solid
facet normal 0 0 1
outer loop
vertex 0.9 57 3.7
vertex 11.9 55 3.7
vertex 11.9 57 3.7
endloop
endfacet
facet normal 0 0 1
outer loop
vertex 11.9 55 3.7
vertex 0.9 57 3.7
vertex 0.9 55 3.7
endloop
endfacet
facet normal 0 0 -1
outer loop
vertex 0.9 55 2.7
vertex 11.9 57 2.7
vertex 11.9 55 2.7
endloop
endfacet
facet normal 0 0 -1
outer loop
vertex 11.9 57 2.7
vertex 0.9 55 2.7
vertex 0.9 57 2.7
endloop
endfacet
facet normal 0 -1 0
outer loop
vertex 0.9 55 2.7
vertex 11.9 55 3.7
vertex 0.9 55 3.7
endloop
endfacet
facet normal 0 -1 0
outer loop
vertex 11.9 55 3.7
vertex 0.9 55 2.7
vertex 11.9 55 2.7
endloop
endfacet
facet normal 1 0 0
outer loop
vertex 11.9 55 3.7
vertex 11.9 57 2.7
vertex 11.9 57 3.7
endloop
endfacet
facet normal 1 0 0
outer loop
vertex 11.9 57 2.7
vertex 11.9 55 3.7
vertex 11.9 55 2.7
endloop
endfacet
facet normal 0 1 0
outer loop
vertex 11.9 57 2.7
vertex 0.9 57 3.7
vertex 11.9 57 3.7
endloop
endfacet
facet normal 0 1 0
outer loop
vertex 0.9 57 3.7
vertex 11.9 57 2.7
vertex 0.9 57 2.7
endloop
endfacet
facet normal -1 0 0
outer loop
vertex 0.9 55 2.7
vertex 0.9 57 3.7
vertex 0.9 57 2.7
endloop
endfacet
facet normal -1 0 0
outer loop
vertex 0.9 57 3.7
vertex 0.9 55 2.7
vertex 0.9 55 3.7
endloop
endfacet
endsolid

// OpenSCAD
$fn = 100;

shell_thickness = 1;
metal_thickness = 1.3;

bump1_r = 3;
bump1_from_tip = 2.9 + bump1_r;
bump2_r = 3.95;
bump2_from_tip = 49 + bump2_r;


l1 = 11;
l2 = 45;
l3 = 2;
w1 = 12.3;
w2 = 12.8;
w3 = 9;
w4 = 10.5;
h1 = 8.7;
h2 = 2.7;

center = [w2/2, (l1 + l2)/2, h1/2];

x1 = (w2 - w1)/2;
x2 = (w2 + w1)/2;
x3 = w2;
x4 = (w2 + w3)/2;
x5 = (w2 - w3)/2;
x6 = (w2 - w4)/2;
x7 = (w2 + w4)/2;

y1 = l1;
y2 = l1 + l2;
y3 = -l3;

z1 = h1;
z2 = (h1 - h2)*(l2/(l1 + l2)) + h2;
z3 = h2;
z4 = h1/2;

points = [
  [x1, 0, 0],
  [x2, 0, 0],
  [x3, y1, 0],
  [x4, y2, 0],
  [x5, y2, 0],
  [0, y1, 0],
  [x1, 0, z1],
  [x2, 0, z1],
  [x3, y1, z2],
  [x4, y2, z3],
  [x5, y2, z3],
  [0, y1, z2],
  [x6, y3, z4],
  [x7, y3, z4]
];

faces = [
  [0, 1, 2, 3, 4, 5],
  [1, 7, 8, 2],
  [2, 8, 9, 3],
  [3, 9, 10, 4],
  [4, 10, 11, 5],
  [5, 11, 6, 0],
  [6, 11, 10, 9, 8, 7],
  [0, 6, 12],
  [6, 7, 13, 12],
  [1, 13, 7],
  [0, 12, 13, 1]
];

function shell_points(points, d, c) = [for (p=points) [p[0] < c[0] ? p[0]-d : p[0]+d, p[1] < c[1] ? p[1] : p[1]+d, p[2] < 1 ? p[2]-d : p[2]]];



points2 = [
  [x1, 0],
  [x6, y3],
  [x7, y3],
  [x2, 0],
  [x3, y1],
  [x4, y2],
  [x5, y2],
  [0, y1]
];



difference() {
  polyhedron(shell_points(points, shell_thickness, center), faces);
  //#translate([0, -.1, 0]) resize([0, 0, z1*1.01]) polyhedron(points, faces);
  linear_extrude(h1) polygon(points2);
  translate([x3/2, y2-bump1_from_tip, -1.5*shell_thickness]) cylinder(2*shell_thickness, bump1_r, bump1_r);
  translate([x3/2, y2-bump2_from_tip, -1.5*shell_thickness]) cylinder(2*shell_thickness, bump2_r, bump2_r);
}

translate([x5-shell_thickness, y2+shell_thickness-2, z3]) cube([w3+2*shell_thickness, 2, shell_thickness]);
//translate([x1, shell_thickness/2, metal_thickness+shell_thickness/2]) rotate([0, 45, 0]) cube(shell_thickness, center=true);
//translate([x2, shell_thickness/2, metal_thickness+shell_thickness/2]) rotate([0, 45, 0]) cube(shell_thickness, center=true);
